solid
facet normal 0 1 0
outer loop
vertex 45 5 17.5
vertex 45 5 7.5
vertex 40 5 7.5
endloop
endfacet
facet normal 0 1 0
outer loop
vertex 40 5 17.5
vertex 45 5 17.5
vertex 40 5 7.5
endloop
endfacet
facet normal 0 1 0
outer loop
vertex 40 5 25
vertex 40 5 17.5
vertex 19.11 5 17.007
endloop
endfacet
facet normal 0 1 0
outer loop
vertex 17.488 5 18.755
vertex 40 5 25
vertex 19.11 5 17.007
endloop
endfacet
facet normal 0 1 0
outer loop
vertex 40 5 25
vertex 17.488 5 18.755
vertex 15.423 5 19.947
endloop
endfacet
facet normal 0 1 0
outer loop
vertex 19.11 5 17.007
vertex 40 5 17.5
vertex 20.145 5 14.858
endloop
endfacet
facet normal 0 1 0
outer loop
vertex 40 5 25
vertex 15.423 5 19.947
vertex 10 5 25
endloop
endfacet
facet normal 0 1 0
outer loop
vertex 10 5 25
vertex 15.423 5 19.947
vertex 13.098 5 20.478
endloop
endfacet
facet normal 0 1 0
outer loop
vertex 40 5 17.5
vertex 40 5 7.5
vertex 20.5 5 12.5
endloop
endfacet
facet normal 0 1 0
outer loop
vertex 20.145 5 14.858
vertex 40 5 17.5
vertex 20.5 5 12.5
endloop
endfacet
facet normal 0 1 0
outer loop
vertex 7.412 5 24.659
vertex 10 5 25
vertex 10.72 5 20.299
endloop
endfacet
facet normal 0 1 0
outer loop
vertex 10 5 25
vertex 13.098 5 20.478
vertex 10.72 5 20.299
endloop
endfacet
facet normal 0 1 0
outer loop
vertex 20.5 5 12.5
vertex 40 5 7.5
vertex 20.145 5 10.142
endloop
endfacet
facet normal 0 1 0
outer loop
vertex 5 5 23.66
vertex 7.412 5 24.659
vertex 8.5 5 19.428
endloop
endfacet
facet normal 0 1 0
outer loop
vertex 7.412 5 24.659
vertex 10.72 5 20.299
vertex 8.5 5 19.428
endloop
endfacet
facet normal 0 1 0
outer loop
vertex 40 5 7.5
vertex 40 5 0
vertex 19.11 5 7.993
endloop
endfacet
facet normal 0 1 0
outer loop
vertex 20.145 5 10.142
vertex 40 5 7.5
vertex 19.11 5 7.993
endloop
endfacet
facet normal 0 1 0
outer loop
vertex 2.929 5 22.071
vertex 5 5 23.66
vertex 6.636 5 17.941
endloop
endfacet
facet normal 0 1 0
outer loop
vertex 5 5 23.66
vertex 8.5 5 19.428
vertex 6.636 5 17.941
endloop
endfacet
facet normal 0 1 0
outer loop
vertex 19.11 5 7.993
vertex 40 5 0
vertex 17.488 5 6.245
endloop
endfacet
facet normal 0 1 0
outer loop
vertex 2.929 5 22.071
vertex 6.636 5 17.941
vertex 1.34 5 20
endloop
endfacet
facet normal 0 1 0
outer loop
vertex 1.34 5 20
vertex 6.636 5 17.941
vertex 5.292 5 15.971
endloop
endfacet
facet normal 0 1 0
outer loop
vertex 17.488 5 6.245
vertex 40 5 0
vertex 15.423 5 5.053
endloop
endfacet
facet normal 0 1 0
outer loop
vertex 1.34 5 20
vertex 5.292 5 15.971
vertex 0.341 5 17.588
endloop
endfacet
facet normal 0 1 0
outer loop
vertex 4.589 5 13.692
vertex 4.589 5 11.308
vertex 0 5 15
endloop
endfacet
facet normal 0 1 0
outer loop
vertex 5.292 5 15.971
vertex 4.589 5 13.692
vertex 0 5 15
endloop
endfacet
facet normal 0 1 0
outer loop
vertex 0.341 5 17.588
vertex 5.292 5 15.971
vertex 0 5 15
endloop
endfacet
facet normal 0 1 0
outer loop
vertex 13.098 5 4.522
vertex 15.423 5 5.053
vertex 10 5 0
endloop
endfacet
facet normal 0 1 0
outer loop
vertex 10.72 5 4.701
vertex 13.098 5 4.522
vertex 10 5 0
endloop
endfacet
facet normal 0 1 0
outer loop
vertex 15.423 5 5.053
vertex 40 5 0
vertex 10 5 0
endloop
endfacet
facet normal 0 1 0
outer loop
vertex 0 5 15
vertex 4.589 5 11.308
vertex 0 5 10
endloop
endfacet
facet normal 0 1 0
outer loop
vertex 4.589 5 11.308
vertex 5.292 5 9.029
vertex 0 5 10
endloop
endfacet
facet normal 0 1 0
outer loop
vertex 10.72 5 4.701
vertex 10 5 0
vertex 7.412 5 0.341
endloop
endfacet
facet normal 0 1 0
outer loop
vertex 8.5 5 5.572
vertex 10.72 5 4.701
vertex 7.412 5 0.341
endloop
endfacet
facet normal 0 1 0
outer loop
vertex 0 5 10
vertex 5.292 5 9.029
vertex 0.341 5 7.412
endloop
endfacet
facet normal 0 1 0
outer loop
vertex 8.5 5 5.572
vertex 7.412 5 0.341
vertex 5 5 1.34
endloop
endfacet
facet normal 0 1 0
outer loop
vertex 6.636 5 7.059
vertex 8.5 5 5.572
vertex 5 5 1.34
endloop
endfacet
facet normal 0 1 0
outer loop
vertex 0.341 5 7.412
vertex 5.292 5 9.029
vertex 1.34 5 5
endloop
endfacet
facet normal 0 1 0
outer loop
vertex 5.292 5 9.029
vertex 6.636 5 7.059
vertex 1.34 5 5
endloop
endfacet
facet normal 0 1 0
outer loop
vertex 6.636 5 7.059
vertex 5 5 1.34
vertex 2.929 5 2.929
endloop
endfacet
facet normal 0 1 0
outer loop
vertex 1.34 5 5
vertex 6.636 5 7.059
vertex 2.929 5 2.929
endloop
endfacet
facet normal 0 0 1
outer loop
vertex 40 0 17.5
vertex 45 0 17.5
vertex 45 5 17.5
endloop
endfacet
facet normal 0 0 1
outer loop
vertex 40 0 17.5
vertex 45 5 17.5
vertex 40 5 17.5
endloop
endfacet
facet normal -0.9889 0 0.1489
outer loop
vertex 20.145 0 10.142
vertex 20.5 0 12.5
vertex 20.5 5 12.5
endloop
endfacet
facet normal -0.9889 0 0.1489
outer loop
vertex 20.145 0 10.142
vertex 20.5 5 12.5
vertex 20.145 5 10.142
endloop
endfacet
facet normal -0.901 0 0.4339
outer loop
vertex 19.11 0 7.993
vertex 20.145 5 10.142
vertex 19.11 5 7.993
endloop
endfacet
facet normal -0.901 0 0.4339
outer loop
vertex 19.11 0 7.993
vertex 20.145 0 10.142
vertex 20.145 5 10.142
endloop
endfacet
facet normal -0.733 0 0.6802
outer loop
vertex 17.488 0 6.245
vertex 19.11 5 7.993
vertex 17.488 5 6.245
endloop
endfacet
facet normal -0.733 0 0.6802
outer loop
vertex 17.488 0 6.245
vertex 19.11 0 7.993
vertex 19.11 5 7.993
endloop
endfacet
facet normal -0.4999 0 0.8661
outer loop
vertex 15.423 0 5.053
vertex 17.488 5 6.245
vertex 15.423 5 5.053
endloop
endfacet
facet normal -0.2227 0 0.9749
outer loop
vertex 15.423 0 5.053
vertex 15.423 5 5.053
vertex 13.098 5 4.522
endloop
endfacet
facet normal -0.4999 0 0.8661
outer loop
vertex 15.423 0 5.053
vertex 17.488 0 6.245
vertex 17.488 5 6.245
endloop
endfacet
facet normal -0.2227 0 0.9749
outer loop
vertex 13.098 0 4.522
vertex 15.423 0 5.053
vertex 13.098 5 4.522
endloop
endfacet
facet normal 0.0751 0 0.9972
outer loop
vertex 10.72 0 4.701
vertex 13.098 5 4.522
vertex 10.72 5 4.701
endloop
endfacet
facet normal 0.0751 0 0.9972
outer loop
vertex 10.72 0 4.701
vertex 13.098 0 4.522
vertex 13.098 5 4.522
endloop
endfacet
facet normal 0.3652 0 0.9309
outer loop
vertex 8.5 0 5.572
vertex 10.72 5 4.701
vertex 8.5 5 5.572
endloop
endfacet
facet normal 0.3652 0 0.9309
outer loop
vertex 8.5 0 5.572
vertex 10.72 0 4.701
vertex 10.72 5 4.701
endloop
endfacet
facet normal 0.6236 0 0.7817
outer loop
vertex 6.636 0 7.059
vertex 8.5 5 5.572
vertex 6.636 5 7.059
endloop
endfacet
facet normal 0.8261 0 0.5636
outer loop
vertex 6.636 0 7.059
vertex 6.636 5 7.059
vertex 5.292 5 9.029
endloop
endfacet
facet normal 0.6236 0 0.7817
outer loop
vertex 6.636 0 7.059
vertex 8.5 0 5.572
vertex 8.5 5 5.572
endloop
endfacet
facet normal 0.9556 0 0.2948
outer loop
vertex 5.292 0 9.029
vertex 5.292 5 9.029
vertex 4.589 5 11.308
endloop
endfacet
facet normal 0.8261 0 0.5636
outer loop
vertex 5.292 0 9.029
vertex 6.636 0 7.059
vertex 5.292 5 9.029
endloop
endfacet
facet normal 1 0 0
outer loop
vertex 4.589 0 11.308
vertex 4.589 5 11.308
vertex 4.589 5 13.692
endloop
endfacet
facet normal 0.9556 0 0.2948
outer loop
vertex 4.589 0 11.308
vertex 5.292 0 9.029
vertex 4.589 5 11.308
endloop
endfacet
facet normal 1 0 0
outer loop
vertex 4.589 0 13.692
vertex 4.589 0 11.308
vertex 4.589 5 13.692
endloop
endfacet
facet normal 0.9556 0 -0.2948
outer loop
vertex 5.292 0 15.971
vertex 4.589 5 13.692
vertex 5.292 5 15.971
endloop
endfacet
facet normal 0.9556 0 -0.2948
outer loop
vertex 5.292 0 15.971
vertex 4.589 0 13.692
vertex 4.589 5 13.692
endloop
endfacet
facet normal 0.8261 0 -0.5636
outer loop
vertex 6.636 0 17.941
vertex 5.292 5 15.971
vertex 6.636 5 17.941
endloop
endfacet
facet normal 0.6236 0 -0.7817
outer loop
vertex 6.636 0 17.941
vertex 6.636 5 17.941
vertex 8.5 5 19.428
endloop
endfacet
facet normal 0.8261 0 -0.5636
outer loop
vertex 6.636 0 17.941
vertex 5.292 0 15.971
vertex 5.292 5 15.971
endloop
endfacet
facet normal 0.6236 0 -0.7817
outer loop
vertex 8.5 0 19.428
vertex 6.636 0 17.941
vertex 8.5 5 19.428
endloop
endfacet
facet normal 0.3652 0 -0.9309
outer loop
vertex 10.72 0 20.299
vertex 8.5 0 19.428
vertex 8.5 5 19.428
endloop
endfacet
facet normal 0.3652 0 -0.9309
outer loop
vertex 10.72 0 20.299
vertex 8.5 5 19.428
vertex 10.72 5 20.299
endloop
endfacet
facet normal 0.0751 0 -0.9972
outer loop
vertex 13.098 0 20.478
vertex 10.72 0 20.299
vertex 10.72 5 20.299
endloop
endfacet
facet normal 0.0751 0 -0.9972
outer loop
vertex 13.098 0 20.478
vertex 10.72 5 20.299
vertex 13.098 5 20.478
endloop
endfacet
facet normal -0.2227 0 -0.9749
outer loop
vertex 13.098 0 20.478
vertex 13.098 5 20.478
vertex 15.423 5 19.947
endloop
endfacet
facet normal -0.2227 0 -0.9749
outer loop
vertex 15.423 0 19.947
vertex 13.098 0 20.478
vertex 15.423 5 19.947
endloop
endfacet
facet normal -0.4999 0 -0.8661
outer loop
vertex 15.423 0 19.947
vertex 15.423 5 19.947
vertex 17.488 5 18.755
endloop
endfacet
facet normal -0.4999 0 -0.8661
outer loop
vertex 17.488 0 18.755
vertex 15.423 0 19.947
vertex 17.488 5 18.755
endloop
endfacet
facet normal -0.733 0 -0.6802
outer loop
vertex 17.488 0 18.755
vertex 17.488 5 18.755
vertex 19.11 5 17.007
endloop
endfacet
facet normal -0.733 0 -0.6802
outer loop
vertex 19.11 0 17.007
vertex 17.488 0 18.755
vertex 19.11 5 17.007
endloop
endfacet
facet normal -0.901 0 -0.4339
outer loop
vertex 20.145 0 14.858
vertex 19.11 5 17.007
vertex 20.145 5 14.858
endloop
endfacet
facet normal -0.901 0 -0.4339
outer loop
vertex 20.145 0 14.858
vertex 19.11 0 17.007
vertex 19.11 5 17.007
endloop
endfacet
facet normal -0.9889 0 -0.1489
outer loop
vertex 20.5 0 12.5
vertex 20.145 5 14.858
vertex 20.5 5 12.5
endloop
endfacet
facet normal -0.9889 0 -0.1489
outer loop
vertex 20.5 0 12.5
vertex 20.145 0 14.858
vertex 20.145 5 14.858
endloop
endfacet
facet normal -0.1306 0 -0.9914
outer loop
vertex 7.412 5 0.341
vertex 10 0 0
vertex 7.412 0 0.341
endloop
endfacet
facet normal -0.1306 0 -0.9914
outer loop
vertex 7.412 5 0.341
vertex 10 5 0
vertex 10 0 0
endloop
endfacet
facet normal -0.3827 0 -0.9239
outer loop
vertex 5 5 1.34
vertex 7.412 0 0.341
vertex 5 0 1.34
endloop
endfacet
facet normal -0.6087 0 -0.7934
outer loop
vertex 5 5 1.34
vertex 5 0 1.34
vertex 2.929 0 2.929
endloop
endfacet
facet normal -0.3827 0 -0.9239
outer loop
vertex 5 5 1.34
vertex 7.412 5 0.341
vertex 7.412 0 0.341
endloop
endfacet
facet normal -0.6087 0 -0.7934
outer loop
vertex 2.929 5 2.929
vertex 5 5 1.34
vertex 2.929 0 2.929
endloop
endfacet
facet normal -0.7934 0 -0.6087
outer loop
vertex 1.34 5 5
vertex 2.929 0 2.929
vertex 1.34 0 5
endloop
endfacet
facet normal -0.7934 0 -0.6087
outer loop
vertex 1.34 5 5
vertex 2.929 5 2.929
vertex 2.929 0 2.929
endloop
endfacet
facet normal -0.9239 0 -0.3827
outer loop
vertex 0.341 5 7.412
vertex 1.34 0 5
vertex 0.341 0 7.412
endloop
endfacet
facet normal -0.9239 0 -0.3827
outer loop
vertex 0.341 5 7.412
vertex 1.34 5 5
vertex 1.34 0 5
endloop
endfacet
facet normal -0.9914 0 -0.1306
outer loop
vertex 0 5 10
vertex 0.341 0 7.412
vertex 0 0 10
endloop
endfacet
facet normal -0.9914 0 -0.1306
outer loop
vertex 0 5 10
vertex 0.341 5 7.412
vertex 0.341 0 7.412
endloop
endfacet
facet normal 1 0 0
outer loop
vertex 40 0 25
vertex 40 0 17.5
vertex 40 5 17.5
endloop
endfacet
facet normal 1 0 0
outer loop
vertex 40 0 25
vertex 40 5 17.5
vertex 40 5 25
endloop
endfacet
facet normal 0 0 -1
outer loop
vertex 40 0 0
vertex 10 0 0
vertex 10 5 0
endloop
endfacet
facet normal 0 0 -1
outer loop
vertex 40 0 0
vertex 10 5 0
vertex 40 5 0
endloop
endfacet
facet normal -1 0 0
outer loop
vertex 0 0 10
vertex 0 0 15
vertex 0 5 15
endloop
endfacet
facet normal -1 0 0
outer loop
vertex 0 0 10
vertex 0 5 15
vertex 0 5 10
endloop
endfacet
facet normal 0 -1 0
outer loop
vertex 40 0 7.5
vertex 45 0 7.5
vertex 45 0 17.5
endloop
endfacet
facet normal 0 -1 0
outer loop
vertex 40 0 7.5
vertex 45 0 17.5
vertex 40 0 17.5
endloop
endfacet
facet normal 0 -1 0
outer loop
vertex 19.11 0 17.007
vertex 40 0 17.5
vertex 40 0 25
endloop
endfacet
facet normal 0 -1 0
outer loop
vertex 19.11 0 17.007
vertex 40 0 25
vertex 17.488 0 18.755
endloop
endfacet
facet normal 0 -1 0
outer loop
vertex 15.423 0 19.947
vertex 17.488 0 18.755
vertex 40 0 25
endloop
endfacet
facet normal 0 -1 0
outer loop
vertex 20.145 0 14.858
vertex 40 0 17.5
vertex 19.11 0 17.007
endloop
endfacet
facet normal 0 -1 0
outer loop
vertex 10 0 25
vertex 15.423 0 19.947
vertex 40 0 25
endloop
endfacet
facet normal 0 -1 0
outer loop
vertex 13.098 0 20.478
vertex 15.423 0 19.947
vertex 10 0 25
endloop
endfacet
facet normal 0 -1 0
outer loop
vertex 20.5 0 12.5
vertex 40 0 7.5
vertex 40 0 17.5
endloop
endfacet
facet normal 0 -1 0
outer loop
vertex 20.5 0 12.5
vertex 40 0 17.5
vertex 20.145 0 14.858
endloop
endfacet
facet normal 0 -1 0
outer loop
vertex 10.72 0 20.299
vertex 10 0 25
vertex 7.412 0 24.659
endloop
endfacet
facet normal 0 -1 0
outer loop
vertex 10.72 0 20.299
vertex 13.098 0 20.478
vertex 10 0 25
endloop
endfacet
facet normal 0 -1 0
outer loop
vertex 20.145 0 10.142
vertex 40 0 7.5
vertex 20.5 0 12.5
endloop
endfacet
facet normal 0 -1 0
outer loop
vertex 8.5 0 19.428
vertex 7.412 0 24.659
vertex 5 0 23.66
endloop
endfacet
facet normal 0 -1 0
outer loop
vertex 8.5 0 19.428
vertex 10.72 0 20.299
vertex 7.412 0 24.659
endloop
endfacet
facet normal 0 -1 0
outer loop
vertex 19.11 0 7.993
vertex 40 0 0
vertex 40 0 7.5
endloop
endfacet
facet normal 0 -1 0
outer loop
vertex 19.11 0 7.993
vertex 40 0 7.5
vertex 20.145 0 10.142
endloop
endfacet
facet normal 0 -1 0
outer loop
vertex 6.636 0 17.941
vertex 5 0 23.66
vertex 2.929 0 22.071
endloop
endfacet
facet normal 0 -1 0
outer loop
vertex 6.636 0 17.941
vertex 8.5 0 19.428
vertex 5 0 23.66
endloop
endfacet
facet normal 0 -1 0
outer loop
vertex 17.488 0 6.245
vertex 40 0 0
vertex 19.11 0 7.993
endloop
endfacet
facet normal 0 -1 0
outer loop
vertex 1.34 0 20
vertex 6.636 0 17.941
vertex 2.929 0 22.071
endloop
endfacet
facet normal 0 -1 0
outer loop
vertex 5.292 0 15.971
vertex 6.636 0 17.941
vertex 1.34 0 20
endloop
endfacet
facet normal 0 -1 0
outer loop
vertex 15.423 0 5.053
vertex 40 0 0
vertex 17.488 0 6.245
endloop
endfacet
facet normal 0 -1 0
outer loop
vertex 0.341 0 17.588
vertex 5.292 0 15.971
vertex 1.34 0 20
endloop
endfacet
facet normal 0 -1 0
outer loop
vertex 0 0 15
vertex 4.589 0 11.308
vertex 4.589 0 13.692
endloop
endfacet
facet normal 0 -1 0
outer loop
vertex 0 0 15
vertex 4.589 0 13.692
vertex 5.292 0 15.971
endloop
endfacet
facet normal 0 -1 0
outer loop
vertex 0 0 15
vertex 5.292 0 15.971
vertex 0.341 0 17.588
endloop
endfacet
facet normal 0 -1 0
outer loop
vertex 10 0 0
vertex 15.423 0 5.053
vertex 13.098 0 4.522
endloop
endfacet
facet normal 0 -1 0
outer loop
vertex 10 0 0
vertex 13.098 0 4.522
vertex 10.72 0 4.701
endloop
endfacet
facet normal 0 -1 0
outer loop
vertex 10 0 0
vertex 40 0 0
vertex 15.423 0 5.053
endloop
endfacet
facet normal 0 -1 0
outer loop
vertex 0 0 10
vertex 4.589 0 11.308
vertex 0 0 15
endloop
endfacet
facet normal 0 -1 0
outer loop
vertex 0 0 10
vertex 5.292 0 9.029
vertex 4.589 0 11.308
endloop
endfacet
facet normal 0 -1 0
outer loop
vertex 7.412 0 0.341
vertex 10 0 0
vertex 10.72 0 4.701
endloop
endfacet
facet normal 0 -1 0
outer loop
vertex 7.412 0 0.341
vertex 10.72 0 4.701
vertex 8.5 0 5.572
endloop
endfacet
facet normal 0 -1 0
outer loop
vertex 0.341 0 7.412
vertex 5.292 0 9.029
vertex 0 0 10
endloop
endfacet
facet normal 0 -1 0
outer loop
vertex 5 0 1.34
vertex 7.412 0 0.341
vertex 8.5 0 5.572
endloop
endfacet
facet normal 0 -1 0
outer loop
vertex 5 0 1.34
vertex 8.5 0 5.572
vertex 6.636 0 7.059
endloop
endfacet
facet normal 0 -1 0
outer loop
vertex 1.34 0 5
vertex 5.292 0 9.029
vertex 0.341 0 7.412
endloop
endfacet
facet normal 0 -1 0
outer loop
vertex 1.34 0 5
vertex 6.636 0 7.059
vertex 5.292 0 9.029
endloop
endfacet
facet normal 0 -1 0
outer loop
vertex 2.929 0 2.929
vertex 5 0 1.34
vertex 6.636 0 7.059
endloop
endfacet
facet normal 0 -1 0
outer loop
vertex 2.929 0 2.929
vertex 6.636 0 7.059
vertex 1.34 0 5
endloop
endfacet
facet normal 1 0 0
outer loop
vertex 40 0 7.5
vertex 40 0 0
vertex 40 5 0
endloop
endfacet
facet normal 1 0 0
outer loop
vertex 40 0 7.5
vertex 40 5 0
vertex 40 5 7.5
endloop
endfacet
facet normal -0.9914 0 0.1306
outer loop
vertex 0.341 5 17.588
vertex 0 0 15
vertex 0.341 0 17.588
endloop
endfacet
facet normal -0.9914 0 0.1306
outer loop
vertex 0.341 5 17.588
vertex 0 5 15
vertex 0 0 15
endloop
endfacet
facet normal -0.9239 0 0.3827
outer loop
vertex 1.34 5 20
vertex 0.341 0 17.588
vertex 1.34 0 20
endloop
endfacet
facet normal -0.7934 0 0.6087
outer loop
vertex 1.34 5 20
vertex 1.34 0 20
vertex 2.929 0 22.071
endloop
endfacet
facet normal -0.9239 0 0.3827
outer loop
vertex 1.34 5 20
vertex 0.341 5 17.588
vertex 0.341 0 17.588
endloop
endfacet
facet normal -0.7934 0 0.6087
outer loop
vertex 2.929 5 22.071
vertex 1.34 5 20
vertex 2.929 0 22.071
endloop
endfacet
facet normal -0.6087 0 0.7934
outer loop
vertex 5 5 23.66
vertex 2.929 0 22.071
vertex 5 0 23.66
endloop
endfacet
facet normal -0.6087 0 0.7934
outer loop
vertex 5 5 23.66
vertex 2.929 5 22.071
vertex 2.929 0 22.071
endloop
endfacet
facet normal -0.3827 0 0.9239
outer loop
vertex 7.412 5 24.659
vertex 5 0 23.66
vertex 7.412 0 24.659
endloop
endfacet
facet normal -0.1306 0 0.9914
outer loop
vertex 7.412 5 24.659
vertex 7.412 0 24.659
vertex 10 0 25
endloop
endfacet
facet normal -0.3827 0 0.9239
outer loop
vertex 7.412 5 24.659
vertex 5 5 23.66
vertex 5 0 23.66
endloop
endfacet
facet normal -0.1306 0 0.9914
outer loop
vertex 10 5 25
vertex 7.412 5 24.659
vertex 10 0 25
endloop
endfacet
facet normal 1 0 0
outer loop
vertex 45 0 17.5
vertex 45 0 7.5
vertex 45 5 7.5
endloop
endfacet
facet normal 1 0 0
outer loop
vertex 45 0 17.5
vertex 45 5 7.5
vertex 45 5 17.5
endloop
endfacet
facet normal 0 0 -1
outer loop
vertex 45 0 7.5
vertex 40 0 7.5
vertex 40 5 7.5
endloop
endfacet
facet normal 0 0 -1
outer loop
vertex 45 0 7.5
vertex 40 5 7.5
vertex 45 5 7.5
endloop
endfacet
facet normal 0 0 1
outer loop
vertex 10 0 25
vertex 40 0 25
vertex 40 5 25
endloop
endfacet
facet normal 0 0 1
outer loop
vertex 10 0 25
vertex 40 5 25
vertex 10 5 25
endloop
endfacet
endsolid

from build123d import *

# Parameters (mm, degrees)
ESQUISSE1_R        = 8
BOSS_EXTRU_1_DEPTH = 5
CONG_1_R           = 10


with BuildPart() as part:
    # Esquisse1 → Boss.-Extru.1 (new body)
    with BuildSketch(Plane(origin=(0, 0, 0), x_dir=(1, 0, 0), z_dir=(0, 1, 0))):
        Polygon((40, -7.5), (45, -7.5), (45, -17.5), (40, -17.5), (40, -25), (0, -25), (0, 0), (40, 0), align=None)
        with Locations((12.5, -12.5)):
            Circle(ESQUISSE1_R, mode=Mode.SUBTRACT)
    extrude(amount=BOSS_EXTRU_1_DEPTH)

    # Congé1
    cong_1_edges = [part.edges().sort_by_distance(p)[0] for p in [
        (0, 2.5, 0),
        (0, 2.5, 25),
    ]]
    fillet(cong_1_edges, radius=CONG_1_R)


solid = part.part
